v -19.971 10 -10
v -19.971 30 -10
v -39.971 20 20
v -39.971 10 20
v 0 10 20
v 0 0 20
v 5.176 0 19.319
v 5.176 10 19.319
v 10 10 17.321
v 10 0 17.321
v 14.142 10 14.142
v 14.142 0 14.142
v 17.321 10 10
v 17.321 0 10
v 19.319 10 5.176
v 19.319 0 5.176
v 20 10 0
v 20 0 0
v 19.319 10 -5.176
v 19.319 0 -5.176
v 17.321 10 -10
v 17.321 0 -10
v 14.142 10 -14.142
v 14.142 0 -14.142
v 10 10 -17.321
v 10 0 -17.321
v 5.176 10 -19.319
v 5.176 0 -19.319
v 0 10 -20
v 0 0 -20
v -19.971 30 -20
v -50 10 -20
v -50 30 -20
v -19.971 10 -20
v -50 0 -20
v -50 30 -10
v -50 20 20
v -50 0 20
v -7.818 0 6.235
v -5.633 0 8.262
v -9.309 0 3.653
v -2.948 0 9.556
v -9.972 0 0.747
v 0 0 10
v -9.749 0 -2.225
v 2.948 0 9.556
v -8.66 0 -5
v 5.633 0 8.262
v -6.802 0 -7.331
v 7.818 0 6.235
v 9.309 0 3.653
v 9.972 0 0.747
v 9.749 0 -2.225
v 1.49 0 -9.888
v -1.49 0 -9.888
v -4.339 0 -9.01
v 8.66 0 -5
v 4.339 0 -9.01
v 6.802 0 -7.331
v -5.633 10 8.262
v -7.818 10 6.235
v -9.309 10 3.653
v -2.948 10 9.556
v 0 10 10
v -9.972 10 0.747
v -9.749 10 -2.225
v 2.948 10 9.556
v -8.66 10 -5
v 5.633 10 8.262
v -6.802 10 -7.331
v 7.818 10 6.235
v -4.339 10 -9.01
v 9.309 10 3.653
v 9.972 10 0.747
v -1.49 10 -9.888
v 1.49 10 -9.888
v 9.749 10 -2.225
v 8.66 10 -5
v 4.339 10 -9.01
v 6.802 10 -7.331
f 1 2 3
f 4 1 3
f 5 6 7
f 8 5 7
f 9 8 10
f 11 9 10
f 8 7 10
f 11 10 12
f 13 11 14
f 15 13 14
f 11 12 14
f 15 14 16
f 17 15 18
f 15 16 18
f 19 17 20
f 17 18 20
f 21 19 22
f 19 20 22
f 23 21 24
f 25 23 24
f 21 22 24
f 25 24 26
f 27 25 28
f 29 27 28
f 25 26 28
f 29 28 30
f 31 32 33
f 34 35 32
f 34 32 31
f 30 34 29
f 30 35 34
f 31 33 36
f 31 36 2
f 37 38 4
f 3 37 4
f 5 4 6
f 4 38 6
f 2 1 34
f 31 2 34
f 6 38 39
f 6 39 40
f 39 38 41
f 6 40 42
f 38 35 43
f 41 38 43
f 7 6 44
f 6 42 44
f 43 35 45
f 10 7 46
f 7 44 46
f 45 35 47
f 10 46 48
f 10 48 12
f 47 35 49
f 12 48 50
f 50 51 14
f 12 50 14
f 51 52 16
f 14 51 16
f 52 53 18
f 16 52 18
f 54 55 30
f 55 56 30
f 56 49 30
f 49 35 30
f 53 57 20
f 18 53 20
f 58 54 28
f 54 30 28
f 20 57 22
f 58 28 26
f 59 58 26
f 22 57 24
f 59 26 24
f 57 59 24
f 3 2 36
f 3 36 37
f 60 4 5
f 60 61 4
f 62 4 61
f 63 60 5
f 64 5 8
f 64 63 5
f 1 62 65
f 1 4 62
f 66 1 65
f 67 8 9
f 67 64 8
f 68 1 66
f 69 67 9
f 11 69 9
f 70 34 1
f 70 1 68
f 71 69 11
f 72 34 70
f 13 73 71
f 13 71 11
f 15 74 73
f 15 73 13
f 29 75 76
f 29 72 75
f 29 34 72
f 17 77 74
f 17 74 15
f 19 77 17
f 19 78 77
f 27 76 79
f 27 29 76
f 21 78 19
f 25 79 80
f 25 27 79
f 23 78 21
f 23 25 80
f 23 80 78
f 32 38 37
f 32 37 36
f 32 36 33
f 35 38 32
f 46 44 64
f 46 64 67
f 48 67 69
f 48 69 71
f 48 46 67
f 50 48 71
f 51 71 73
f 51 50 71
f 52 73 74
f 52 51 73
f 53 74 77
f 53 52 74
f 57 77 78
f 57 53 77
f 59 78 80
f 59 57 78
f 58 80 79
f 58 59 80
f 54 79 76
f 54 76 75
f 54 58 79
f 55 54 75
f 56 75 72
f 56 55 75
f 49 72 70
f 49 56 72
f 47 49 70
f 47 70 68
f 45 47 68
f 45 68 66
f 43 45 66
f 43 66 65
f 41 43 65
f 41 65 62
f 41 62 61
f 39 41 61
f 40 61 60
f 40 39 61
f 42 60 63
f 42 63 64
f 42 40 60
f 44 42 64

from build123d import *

# Parameters (mm, degrees)
SKETCH1_R           = 10
BOSS_EXTRUDE1_DEPTH = 10
SKETCH2_W           = 30.028941415
SKETCH2_H           = 40
BOSS_EXTRUDE2_DEPTH = 20
SKETCH3_OUTSIDE_W   = 59.204
SKETCH3_OUTSIDE_H   = 49.204
CUT_EXTRUDE1_DEPTH  = 36
CUT_EXTRUDE2_DEPTH  = 20


with BuildPart() as part:
    # Sketch1 → Boss-Extrude1 (new body)
    with BuildSketch(Plane(origin=(0, 0, 0), x_dir=(1, 0, 0), z_dir=(0, 1, 0))):
        with BuildLine():
            Line((0, 20), (-50, 20))
            Line((-50, 20), (-50, -20))
            Line((-50, -20), (0, -20))
            ThreePointArc((0, -20), (20, 0), (0, 20))
        make_face()
        with Locations(Location((0, 0, 0), (0, 0, 270))):
            Circle(SKETCH1_R, mode=Mode.SUBTRACT)
    extrude(amount=BOSS_EXTRUDE1_DEPTH)

    # Sketch2 → Boss-Extrude2 (add)
    with BuildSketch(Plane(origin=(0, 10, 0), x_dir=(1, 0, 0), z_dir=(0, 1, 0))):
        with Locations((-34.985529293, 0)):
            Rectangle(SKETCH2_W, SKETCH2_H)
    extrude(amount=BOSS_EXTRUDE2_DEPTH)

    # Sketch3 outside → Cut-Extrude1 (cut)
    with BuildSketch(Plane(origin=(-19.971058585, 0, 0), x_dir=(0, 0, -1), z_dir=(1, 0, 0))):
        with Locations((0, 15)):
            Rectangle(SKETCH3_OUTSIDE_W, SKETCH3_OUTSIDE_H)
        Polygon((20, 30), (10, 30), (-20, 20), (-20, 0), (20, 0), align=None, mode=Mode.SUBTRACT)
    extrude(amount=-CUT_EXTRUDE1_DEPTH, mode=Mode.SUBTRACT)

    # Sketch4 → Cut-Extrude2 (cut)
    with BuildSketch(Plane(origin=(0, 30, 0), x_dir=(1, 0, 0), z_dir=(0, 1, 0))):
        Polygon((-19.971058585, -20), (-19.971058585, 10), (-39.971058585, -20), align=None)
    extrude(amount=-CUT_EXTRUDE2_DEPTH, mode=Mode.SUBTRACT)


solid = part.part
